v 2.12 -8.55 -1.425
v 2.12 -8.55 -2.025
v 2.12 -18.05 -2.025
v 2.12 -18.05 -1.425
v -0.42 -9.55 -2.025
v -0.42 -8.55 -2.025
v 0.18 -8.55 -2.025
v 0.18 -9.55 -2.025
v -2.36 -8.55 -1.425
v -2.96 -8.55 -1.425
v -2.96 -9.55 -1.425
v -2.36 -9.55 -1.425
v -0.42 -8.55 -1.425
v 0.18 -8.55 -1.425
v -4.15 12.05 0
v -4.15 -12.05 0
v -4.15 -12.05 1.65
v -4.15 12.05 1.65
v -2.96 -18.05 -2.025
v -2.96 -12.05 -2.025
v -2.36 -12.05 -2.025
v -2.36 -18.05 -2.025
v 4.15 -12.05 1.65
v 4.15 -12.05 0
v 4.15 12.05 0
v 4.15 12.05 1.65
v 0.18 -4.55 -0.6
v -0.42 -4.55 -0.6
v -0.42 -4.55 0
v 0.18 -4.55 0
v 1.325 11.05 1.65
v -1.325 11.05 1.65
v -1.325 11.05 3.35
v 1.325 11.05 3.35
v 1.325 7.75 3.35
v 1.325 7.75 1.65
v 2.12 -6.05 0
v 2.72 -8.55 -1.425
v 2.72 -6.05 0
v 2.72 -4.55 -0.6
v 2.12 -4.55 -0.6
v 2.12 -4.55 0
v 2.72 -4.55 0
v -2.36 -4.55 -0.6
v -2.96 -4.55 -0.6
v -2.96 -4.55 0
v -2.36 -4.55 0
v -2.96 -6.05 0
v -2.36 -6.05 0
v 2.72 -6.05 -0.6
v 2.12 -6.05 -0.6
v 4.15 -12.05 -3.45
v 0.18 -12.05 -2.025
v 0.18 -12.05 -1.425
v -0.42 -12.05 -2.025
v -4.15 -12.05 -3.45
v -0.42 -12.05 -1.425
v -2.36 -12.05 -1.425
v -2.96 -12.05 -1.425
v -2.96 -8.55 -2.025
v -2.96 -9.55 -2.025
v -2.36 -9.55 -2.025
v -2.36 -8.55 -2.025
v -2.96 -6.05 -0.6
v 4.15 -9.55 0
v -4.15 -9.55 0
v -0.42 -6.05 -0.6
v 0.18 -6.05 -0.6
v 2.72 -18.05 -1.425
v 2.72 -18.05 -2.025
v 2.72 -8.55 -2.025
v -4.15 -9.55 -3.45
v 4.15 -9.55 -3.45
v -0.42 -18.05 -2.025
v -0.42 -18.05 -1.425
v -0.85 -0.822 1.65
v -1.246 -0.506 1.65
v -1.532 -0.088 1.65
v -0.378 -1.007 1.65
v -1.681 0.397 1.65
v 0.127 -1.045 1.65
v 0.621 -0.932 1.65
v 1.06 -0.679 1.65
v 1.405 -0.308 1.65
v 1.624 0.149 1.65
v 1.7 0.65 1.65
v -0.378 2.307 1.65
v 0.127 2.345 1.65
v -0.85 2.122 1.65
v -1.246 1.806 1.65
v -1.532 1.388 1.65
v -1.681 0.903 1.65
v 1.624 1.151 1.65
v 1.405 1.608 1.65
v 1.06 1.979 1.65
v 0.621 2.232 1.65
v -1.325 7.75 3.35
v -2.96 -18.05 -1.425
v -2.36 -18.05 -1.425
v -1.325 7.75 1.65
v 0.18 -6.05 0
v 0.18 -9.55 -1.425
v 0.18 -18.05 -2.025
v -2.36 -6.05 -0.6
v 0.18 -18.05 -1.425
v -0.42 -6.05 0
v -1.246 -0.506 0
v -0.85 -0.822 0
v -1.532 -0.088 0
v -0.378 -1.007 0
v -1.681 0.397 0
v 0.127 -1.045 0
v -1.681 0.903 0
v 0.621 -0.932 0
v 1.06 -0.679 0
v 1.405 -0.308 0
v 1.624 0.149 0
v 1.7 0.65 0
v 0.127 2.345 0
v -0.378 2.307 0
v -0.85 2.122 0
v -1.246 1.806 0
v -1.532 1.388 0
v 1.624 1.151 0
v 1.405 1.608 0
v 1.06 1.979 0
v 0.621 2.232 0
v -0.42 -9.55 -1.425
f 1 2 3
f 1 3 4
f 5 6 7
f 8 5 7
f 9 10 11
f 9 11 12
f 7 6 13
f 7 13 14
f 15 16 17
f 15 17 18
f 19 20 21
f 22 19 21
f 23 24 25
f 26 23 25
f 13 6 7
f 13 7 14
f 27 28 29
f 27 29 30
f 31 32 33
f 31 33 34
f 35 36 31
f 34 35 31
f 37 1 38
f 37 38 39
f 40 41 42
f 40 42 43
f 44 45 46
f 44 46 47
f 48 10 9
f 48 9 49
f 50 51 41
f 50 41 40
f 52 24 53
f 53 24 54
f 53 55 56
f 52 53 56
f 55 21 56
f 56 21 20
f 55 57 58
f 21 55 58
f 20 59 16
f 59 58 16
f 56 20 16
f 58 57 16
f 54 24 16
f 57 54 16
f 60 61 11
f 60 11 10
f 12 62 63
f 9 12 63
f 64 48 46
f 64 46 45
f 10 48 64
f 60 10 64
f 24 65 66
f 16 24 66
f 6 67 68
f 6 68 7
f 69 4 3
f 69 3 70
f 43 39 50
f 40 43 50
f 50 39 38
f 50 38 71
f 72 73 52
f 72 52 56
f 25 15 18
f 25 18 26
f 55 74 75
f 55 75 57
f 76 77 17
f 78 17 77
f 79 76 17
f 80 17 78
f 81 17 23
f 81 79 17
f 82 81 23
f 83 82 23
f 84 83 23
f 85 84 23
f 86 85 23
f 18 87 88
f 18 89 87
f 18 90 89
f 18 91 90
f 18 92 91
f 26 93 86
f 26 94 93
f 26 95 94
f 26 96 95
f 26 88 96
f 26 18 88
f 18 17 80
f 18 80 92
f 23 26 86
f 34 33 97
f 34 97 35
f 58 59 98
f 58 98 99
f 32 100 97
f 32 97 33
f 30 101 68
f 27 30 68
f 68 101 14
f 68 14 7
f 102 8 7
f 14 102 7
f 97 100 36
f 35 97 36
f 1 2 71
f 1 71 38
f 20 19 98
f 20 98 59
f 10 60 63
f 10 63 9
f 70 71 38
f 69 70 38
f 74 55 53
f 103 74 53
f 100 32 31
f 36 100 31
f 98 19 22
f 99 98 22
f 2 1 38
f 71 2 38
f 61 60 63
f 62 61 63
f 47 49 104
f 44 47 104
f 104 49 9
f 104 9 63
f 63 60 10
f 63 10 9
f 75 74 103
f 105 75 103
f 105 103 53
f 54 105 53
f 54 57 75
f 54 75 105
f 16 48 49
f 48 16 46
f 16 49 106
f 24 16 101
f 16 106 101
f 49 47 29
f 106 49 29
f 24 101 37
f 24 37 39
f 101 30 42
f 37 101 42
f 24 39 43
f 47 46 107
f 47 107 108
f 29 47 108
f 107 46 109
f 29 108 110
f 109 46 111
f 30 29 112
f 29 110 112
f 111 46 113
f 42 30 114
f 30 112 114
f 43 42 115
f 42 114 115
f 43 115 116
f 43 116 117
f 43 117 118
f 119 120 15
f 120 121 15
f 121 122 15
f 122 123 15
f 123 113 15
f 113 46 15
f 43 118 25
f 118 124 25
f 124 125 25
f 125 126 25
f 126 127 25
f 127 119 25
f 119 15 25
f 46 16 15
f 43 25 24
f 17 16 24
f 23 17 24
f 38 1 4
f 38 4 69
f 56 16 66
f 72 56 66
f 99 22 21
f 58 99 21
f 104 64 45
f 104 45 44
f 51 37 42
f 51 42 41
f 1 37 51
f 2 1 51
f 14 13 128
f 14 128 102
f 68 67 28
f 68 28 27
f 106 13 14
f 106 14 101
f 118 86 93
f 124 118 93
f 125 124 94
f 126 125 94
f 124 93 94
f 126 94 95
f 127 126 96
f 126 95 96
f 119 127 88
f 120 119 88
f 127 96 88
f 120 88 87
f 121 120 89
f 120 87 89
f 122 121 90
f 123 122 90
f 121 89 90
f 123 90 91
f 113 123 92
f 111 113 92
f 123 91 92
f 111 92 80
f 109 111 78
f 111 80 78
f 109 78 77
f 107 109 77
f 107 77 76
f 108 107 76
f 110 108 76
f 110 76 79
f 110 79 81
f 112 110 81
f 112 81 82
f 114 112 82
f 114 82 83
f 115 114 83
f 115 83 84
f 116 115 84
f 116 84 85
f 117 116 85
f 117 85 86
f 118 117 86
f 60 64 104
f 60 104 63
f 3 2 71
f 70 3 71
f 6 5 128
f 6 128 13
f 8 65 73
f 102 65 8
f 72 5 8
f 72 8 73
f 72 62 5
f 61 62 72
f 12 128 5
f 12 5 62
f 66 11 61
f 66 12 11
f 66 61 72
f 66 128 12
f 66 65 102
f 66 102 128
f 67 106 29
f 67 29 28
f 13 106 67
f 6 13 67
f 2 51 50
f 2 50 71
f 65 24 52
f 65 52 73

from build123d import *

# Parameters (mm, degrees)
SKETCH_1_W                   = 8.3
SKETCH_1_H                   = 24.1
EXTRUDE_1_DEPTH              = 1.65
SKETCH_2_W                   = 2.65
SKETCH_2_H                   = 3.3
EXTRUDE_2_DEPTH              = 1.7
SKETCH_3_R                   = 1.7
CUT_EXTRUDE_1_DEPTH          = 13.857488091
SKETCH_4_W                   = 8.3
SKETCH_4_H                   = 2.5
EXTRUDE_3_DEPTH              = 3.45
EXTRUDE_START                = -3.5
SKETCH_5_W                   = 0.6
SKETCH_5_H                   = 0.6
EXTRUDE_4_DEPTH              = 9.5
PATTERN_START                = -2.025
PATTERN_LINEAR_1_OUTLINE_W   = 0.6
PATTERN_LINEAR_1_OUTLINE_H   = 1
PATTERN_LINEAR_1_OUTLINE_H_2 = 6
PATTERN_LINEAR_1_DEPTH       = 0.6
EXTRUDE_5_DEPTH              = 0.6
PATTERN_LINEAR_2_COUNT       = 3
PATTERN_LINEAR_2_PITCH       = 2.54
SKETCH_7_W                   = 0.6
SKETCH_7_H                   = 0.6
EXTRUDE_6_DEPTH              = 1.5
PATTERN_LINEAR_3_COUNT       = 3
PATTERN_LINEAR_3_PITCH       = 2.54


# Read off the part's stored shape, not the designer's step: 直線複製排列1
with BuildPart() as part:
    # 草圖1 → 填料-伸長1 (new body)
    with BuildSketch(Plane.XY):
        Rectangle(SKETCH_1_W, SKETCH_1_H)
    extrude(amount=EXTRUDE_1_DEPTH)

    # 草圖3 → 除料-伸長1 (cut, through all)
    with BuildSketch(Plane.XY.offset(1.65)):
        with Locations((0, 0.65)):
            Circle(SKETCH_3_R)
    extrude(amount=-CUT_EXTRUDE_1_DEPTH, mode=Mode.SUBTRACT)



with BuildPart() as body_2:
    # 草圖2 → 填料-伸長2 (new body)
    with BuildSketch(Plane.XY.offset(1.65)):
        with Locations((0, 9.4)):
            Rectangle(SKETCH_2_W, SKETCH_2_H)
    extrude(amount=EXTRUDE_2_DEPTH)


with BuildPart() as body_3:
    # 草圖4 → 填料-伸長3 (new body)
    with BuildSketch(Plane(origin=(0, 0, 0), x_dir=(-1, 0, 0), z_dir=(0, 0, -1))):
        with Locations((0, -10.8)):
            Rectangle(SKETCH_4_W, SKETCH_4_H)
    extrude(amount=EXTRUDE_3_DEPTH)

    # 直線複製排列1 outline → 直線複製排列1 (add)
    with BuildSketch(Plane.XY.offset(PATTERN_START)):
        with Locations((-0.12, -9.05)):
            Rectangle(PATTERN_LINEAR_1_OUTLINE_W, PATTERN_LINEAR_1_OUTLINE_H)
        with Locations((-2.66, -9.05)):
            Rectangle(PATTERN_LINEAR_1_OUTLINE_W, PATTERN_LINEAR_1_OUTLINE_H)
        with Locations((-2.66, -15.05)):
            Rectangle(PATTERN_LINEAR_1_OUTLINE_W, PATTERN_LINEAR_1_OUTLINE_H_2)
        with Locations((-0.12, -15.05)):
            Rectangle(PATTERN_LINEAR_1_OUTLINE_W, PATTERN_LINEAR_1_OUTLINE_H_2)
    extrude(amount=PATTERN_LINEAR_1_DEPTH)


with BuildPart() as body_4:
    # 草圖5 → 填料-伸長4 (new body)
    with BuildSketch(Plane.XZ.offset(12.05).offset(EXTRUDE_START)):
        with Locations((2.42, -1.725)):
            Rectangle(SKETCH_5_W, SKETCH_5_H)
    extrude(amount=EXTRUDE_4_DEPTH)


with BuildPart() as body_5:
    # 草圖6 → 填料-伸長5 (new body)
    with BuildSketch(Plane.ZY.offset(2.96)):
        Polygon((-1.425, -8.55), (0, -6.05), (-0.6, -6.05), (-2.025, -8.55), align=None)
    extrude_5 = extrude(amount=-EXTRUDE_5_DEPTH)


with BuildPart() as pattern_linear_2_1:
    # 直線複製排列2: pattern copy
    add(extrude_5.moved(Location(Vector(1, 0, 0) * (1 * PATTERN_LINEAR_2_PITCH))))


with BuildPart() as pattern_linear_2_2:
    # 直線複製排列2: pattern copy
    add(extrude_5.moved(Location(Vector(1, 0, 0) * (2 * PATTERN_LINEAR_2_PITCH))))


with BuildPart() as part_1:
    add(part.part)

    add(body_5.part)  # 填料-伸長6 merges body 5
    # 草圖7 → 填料-伸長6 (add)
    with BuildSketch(Plane(origin=(0, -6.05, 0), x_dir=(1, 0, 0), z_dir=(0, 1, 0))):
        with Locations((-2.66, 0.3)):
            Rectangle(SKETCH_7_W, SKETCH_7_H)
    extrude_6 = extrude(amount=EXTRUDE_6_DEPTH)


    add(pattern_linear_2_1.part)  # 直線複製排列3 merges 直線複製排列2_1

    add(pattern_linear_2_2.part)  # 直線複製排列3 merges 直線複製排列2_2
    # 直線複製排列3: 填料-伸長6 ×3
    with Locations(*[(i * PATTERN_LINEAR_3_PITCH, 0, 0) for i in range(1, PATTERN_LINEAR_3_COUNT)]):
        add(extrude_6)


solid = Compound([body_2.part, body_3.part, body_4.part, part_1.part])
